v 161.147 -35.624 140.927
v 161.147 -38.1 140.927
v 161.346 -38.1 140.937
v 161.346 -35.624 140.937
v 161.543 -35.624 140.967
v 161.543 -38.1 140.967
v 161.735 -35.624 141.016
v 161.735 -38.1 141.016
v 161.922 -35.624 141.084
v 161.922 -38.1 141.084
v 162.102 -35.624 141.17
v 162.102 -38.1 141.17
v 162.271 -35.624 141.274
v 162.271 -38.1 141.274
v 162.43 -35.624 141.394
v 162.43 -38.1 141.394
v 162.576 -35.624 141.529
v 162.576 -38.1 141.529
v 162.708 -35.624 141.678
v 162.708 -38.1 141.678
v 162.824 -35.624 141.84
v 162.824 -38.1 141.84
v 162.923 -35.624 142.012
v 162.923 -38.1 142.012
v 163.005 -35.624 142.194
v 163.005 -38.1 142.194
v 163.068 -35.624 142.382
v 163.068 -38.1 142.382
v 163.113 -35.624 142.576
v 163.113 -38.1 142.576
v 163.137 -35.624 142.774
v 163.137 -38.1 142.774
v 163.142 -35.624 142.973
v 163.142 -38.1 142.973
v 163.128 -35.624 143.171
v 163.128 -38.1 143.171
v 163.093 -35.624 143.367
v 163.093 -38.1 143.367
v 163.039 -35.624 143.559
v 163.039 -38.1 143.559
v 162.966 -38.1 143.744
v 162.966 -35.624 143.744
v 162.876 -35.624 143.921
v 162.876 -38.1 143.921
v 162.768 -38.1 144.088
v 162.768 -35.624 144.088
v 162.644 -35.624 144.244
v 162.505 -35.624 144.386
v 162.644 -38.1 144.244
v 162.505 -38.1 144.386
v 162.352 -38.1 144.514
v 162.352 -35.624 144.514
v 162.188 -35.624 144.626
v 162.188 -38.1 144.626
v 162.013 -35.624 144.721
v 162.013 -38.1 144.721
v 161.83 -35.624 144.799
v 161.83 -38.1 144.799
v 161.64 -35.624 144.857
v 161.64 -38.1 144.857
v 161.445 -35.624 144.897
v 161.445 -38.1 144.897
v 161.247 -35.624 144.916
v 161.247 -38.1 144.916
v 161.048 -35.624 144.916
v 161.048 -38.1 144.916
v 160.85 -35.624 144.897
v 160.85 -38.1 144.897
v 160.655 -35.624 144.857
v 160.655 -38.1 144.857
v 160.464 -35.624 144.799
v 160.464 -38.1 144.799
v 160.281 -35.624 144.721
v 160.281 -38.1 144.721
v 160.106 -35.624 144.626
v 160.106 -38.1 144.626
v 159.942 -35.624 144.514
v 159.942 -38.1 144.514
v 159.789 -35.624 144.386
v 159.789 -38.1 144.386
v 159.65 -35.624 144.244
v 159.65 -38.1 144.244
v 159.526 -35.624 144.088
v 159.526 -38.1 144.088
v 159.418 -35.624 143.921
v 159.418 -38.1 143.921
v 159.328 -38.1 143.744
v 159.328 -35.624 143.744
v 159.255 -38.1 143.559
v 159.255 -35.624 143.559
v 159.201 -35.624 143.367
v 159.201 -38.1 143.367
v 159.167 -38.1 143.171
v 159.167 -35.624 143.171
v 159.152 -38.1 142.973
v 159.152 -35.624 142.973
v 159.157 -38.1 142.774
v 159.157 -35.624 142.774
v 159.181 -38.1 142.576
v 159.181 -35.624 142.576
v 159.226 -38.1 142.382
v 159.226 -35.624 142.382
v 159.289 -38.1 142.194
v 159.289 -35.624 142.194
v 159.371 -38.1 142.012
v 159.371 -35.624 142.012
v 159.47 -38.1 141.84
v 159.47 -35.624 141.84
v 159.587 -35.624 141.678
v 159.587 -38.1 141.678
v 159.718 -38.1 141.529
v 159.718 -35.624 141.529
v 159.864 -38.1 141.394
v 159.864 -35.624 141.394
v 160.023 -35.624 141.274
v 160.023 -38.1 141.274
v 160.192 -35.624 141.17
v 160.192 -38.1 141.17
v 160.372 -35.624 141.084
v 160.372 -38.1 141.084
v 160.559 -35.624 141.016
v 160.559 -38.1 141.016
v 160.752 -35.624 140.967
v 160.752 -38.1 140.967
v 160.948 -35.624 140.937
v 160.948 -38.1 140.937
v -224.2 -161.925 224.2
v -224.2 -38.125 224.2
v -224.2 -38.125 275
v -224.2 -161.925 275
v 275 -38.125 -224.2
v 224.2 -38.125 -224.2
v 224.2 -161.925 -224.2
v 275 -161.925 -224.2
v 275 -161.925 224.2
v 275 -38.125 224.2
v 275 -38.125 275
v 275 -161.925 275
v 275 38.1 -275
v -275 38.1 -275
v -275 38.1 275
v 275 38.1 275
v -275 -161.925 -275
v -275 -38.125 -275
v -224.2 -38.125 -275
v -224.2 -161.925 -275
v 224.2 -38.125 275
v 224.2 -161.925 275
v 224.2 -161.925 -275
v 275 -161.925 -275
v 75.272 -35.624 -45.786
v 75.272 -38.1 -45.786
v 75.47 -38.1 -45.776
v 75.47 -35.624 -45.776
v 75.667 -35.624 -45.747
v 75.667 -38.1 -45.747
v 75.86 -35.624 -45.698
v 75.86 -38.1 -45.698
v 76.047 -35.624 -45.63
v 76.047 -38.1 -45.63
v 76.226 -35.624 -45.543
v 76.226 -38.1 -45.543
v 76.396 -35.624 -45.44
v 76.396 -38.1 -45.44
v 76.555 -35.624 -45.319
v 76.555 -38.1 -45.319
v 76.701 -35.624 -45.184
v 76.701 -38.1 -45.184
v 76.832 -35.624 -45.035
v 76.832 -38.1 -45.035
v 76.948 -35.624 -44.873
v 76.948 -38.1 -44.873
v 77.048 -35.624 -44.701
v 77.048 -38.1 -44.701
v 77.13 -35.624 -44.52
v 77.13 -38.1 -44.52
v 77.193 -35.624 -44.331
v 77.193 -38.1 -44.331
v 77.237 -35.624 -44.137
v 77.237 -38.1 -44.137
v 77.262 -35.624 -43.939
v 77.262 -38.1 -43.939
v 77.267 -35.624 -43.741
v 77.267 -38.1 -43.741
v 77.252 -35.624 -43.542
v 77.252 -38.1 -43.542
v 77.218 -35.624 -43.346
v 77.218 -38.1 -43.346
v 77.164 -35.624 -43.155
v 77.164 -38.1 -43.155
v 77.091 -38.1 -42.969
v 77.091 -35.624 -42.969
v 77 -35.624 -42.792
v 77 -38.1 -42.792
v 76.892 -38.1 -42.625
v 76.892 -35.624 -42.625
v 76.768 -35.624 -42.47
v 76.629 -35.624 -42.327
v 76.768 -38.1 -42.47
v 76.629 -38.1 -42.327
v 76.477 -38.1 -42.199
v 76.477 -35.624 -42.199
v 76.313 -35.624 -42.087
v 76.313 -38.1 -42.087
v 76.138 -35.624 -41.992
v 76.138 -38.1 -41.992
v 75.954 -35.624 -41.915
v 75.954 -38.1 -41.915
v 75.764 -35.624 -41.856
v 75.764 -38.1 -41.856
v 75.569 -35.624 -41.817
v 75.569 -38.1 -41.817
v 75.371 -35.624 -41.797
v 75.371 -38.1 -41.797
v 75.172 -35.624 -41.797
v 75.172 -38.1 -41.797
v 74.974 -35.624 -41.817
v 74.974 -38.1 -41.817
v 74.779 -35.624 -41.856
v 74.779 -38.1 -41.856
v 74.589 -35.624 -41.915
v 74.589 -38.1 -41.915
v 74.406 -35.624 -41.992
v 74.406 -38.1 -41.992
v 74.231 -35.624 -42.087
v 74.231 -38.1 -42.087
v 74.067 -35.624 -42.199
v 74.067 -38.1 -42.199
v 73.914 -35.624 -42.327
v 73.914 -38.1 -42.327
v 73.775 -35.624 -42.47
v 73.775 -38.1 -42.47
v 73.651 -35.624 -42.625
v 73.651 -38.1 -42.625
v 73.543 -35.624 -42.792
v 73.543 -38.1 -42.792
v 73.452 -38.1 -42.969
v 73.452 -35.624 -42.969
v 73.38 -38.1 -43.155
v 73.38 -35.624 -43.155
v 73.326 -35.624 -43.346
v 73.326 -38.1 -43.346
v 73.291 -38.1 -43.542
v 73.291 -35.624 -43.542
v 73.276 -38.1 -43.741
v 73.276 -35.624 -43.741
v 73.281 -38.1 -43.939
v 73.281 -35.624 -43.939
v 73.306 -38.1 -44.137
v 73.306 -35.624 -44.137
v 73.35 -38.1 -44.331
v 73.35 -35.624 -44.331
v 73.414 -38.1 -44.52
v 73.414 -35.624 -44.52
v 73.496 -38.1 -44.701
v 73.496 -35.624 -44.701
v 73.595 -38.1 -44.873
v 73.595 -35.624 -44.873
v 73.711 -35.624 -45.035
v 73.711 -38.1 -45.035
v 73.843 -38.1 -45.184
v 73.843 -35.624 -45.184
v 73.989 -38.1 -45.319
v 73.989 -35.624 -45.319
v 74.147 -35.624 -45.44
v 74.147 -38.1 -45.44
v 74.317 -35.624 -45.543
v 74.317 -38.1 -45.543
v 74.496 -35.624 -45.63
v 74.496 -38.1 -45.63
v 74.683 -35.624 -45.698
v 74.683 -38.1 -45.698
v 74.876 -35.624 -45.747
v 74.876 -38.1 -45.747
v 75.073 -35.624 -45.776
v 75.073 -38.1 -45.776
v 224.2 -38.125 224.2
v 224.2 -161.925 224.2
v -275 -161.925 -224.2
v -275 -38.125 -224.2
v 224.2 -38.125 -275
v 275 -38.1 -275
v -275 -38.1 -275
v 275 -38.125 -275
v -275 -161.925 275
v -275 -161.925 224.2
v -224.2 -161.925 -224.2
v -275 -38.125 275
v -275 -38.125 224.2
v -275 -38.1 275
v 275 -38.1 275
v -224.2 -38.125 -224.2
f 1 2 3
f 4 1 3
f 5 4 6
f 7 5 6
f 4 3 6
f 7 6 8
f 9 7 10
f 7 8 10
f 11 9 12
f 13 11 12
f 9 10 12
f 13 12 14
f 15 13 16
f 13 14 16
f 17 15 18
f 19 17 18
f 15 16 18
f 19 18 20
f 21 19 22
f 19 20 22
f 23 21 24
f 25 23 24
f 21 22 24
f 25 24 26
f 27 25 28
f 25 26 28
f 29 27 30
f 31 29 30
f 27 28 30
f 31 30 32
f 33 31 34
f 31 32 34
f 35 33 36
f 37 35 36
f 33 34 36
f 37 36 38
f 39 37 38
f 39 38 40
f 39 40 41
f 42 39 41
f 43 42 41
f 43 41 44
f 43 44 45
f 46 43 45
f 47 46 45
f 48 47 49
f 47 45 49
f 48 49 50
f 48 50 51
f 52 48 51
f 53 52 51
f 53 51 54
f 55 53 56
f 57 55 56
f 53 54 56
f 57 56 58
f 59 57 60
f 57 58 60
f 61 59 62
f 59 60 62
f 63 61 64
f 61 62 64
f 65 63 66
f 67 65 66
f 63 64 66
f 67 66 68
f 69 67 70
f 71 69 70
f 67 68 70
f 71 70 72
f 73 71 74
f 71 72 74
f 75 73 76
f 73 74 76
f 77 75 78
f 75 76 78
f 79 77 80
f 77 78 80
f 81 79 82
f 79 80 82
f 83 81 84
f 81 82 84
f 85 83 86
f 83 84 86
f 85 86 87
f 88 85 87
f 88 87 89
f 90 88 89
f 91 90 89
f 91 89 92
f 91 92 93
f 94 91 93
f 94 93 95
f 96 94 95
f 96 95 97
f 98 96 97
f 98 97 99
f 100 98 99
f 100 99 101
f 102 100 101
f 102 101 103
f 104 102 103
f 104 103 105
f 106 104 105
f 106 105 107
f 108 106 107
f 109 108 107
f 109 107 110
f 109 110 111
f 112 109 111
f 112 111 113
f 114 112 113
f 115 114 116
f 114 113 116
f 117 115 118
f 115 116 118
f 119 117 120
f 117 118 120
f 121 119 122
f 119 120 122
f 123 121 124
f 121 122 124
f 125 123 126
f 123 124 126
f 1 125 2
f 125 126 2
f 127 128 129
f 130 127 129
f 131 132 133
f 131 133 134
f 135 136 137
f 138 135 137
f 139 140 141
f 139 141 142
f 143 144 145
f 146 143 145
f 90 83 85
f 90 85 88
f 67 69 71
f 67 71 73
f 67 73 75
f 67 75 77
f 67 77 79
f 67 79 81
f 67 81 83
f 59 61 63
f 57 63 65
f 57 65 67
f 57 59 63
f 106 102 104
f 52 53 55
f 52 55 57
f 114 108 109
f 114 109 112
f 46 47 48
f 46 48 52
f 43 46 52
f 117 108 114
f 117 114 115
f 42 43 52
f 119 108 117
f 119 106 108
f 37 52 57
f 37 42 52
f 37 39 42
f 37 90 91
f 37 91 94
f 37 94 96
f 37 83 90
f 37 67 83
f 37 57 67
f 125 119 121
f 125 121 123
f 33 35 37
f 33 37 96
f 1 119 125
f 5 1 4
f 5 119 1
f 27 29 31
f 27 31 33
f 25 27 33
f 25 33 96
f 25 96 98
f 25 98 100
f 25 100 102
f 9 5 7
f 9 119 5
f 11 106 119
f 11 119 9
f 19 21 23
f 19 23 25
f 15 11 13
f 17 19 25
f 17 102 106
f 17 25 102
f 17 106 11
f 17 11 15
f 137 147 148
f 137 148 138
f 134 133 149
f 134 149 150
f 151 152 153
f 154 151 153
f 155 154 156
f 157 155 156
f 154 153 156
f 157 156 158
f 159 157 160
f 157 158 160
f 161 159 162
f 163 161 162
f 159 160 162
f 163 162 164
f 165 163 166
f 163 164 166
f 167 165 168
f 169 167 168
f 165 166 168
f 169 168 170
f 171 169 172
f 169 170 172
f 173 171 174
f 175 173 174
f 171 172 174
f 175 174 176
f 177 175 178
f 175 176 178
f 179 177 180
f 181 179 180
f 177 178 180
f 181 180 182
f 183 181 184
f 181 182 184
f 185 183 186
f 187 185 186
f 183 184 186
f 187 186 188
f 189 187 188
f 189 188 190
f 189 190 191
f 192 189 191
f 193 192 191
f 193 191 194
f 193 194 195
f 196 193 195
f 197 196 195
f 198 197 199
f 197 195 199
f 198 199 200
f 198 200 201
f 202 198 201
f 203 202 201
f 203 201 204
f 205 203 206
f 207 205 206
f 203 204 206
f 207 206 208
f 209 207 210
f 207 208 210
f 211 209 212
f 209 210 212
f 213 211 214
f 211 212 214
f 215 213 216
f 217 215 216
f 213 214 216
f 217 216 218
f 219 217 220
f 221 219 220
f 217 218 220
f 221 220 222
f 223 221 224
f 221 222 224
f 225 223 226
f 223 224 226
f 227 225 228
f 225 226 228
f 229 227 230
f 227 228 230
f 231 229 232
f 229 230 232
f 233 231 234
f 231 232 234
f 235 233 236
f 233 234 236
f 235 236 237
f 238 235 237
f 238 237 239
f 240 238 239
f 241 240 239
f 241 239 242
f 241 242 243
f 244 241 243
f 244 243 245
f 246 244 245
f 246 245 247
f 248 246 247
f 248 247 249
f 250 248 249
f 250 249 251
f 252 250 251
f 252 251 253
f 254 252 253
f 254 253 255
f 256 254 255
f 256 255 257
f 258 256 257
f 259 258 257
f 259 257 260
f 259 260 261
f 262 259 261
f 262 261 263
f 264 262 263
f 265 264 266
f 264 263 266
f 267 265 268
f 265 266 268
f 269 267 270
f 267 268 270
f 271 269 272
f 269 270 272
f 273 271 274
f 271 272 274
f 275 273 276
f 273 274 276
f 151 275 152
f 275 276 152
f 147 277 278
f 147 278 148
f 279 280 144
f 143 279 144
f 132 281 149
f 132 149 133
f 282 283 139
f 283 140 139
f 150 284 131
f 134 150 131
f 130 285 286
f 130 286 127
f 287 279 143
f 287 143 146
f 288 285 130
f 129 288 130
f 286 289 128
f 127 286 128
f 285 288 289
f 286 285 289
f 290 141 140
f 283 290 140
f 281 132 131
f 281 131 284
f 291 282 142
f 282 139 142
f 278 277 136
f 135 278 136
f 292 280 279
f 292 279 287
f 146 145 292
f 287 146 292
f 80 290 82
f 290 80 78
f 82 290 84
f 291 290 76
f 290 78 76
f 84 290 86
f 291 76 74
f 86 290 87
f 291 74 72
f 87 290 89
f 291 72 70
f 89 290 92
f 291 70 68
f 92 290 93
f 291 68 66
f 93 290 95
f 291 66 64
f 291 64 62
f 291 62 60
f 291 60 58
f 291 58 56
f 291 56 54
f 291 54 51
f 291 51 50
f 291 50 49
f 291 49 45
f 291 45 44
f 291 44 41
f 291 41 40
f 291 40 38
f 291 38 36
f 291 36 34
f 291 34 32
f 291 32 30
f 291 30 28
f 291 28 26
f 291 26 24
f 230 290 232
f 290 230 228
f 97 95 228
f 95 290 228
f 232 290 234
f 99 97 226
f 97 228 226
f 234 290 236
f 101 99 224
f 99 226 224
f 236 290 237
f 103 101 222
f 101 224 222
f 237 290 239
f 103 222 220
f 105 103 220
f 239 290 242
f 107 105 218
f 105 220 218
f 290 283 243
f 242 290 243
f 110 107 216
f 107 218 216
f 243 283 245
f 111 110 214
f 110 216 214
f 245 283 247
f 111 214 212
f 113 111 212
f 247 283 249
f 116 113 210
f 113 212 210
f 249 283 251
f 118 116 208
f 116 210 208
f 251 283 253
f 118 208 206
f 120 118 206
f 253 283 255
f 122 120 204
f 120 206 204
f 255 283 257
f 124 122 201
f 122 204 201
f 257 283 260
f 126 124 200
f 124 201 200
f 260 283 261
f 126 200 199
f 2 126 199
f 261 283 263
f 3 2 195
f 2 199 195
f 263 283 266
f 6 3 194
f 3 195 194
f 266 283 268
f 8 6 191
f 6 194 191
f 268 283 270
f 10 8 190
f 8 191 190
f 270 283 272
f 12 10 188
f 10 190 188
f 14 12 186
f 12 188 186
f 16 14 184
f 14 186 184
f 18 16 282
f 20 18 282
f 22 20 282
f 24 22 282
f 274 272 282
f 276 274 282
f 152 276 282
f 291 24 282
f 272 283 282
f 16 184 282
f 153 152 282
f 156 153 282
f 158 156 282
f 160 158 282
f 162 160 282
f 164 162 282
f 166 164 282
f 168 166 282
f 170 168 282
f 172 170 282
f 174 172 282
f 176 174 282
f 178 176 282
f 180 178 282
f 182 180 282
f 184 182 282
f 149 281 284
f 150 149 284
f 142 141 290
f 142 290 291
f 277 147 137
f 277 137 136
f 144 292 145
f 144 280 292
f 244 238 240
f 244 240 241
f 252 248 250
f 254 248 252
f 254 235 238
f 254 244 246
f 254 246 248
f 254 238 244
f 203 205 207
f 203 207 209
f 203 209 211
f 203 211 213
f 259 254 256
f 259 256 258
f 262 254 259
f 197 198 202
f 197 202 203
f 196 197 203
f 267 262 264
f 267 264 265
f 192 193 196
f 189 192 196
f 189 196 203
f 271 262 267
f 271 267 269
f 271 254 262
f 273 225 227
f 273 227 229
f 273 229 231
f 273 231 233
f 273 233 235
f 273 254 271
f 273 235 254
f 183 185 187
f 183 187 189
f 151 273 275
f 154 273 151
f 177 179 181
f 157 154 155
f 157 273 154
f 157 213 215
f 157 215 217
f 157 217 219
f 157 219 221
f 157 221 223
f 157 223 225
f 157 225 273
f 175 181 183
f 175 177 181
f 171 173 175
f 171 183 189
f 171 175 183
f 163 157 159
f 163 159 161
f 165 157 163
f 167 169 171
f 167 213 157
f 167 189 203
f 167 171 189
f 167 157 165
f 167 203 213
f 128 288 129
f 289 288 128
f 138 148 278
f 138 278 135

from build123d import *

# Parameters (mm, degrees)
SKETCH3_W               = 550
SKETCH3_H               = 550
BOSS_EXTRUDE2_DEPTH     = 38.1
SKETCH5_W               = 50.8
SKETCH5_H               = 50.8
BOSS_EXTRUDE3_DEPTH     = 373.8
CUT_EXTRUDE1_DEPTH      = 741.126077098
CUT_EXTRUDE1_DEPTH_BACK = 741.126077098
SKETCH6_W               = 655.630835137
SKETCH6_H               = 0.0254
SKETCH7_W               = 550
SKETCH7_H               = 550
CUT_EXTRUDE2_DEPTH      = 249.975
SKETCH8_R               = 1.995991075
SKETCH8_R_2             = 1.996000028
CUT_EXTRUDE3_DEPTH      = 2.4765


with BuildPart() as part:
    # Sketch3 → Boss-Extrude2 (new, symmetric)
    with BuildSketch(Plane(origin=(0, 0, 0), x_dir=(1, 0, 0), z_dir=(0, 1, 0))):
        Rectangle(SKETCH3_W, SKETCH3_H)
    extrude(amount=BOSS_EXTRUDE2_DEPTH, both=True)

    # Sketch5 → Boss-Extrude3 (add)
    with BuildSketch(Plane.XZ.offset(38.1)):
        with Locations((249.6, 249.6)):
            Rectangle(SKETCH5_W, SKETCH5_H)
        with Locations((249.6, -249.6)):
            Rectangle(SKETCH5_W, SKETCH5_H)
        with Locations((-249.6, -249.6)):
            Rectangle(SKETCH5_W, SKETCH5_H)
        with Locations((-249.6, 249.6)):
            Rectangle(SKETCH5_W, SKETCH5_H)
    extrude(amount=BOSS_EXTRUDE3_DEPTH)

    # Sketch6 → Cut-Extrude1 (cut, two sides: drawn at the far end of the back side and taken through both)
    with BuildSketch(Plane(origin=(275, 0, 0), x_dir=(0, 0, -1), z_dir=(1, 0, 0)).offset(-CUT_EXTRUDE1_DEPTH_BACK)):
        with Locations((32.666920981, -38.1127)):
            Rectangle(SKETCH6_W, SKETCH6_H)
    extrude(amount=CUT_EXTRUDE1_DEPTH + CUT_EXTRUDE1_DEPTH_BACK, mode=Mode.SUBTRACT)


with BuildPart() as cut_extrude1_piece_1:
    # of the separate pieces the step leaves, piece 1, a body of its own (cut_extrude1_pieces)
    add(part.part.solids().sort_by_distance((-275, -38.1, -275))[0])

    # Sketch8 → Cut-Extrude3 (cut)
    with BuildSketch(Plane.XZ.offset(38.1)):
        with Locations(Location((161.147032428, 142.922948736, 0), (0, 0, 270))):
            Circle(SKETCH8_R)
        with Locations(Location((75.271738487, -43.7903374, 0), (0, 0, 270))):
            Circle(SKETCH8_R_2)
    extrude(amount=-CUT_EXTRUDE3_DEPTH, mode=Mode.SUBTRACT)


with BuildPart() as cut_extrude1_piece_2:
    # of the separate pieces the step leaves, piece 2, a body of its own (cut_extrude1_pieces)
    add(part.part.solids().sort_by_distance((275, -38.1254, 224.2))[0])


with BuildPart() as cut_extrude1_piece_3:
    # of the separate pieces the step leaves, piece 3, a body of its own (cut_extrude1_pieces)
    add(part.part.solids().sort_by_distance((-275, -411.9, 275))[0])


with BuildPart() as cut_extrude1_piece_4:
    # of the separate pieces the step leaves, piece 4, a body of its own (cut_extrude1_pieces)
    add(part.part.solids().sort_by_distance((-275, -411.9, -275))[0])


with BuildPart() as cut_extrude1_piece_5:
    # of the separate pieces the step leaves, piece 5, a body of its own (cut_extrude1_pieces)
    add(part.part.solids().sort_by_distance((224.2, -38.1254, -275))[0])


with BuildPart() as cut_extrude2_tool:
    # Sketch7 → Cut-Extrude2 (new body)
    with BuildSketch(Plane.XZ.offset(411.9)):
        Rectangle(SKETCH7_W, SKETCH7_H)
    extrude(amount=-CUT_EXTRUDE2_DEPTH)


with BuildPart() as cut_extrude1_piece_2_1:
    add(cut_extrude1_piece_2.part)

    # Cut-Extrude2: cut by cut_extrude2_tool
    add(cut_extrude2_tool.part, mode=Mode.SUBTRACT)


with BuildPart() as cut_extrude1_piece_3_1:
    add(cut_extrude1_piece_3.part)

    # Cut-Extrude2: cut by cut_extrude2_tool
    add(cut_extrude2_tool.part, mode=Mode.SUBTRACT)


with BuildPart() as cut_extrude1_piece_4_1:
    add(cut_extrude1_piece_4.part)

    # Cut-Extrude2: cut by cut_extrude2_tool
    add(cut_extrude2_tool.part, mode=Mode.SUBTRACT)


with BuildPart() as cut_extrude1_piece_5_1:
    add(cut_extrude1_piece_5.part)

    # Cut-Extrude2: cut by cut_extrude2_tool
    add(cut_extrude2_tool.part, mode=Mode.SUBTRACT)


solid = Compound([cut_extrude1_piece_1.part, cut_extrude1_piece_2_1.part, cut_extrude1_piece_3_1.part, cut_extrude1_piece_4_1.part, cut_extrude1_piece_5_1.part])
